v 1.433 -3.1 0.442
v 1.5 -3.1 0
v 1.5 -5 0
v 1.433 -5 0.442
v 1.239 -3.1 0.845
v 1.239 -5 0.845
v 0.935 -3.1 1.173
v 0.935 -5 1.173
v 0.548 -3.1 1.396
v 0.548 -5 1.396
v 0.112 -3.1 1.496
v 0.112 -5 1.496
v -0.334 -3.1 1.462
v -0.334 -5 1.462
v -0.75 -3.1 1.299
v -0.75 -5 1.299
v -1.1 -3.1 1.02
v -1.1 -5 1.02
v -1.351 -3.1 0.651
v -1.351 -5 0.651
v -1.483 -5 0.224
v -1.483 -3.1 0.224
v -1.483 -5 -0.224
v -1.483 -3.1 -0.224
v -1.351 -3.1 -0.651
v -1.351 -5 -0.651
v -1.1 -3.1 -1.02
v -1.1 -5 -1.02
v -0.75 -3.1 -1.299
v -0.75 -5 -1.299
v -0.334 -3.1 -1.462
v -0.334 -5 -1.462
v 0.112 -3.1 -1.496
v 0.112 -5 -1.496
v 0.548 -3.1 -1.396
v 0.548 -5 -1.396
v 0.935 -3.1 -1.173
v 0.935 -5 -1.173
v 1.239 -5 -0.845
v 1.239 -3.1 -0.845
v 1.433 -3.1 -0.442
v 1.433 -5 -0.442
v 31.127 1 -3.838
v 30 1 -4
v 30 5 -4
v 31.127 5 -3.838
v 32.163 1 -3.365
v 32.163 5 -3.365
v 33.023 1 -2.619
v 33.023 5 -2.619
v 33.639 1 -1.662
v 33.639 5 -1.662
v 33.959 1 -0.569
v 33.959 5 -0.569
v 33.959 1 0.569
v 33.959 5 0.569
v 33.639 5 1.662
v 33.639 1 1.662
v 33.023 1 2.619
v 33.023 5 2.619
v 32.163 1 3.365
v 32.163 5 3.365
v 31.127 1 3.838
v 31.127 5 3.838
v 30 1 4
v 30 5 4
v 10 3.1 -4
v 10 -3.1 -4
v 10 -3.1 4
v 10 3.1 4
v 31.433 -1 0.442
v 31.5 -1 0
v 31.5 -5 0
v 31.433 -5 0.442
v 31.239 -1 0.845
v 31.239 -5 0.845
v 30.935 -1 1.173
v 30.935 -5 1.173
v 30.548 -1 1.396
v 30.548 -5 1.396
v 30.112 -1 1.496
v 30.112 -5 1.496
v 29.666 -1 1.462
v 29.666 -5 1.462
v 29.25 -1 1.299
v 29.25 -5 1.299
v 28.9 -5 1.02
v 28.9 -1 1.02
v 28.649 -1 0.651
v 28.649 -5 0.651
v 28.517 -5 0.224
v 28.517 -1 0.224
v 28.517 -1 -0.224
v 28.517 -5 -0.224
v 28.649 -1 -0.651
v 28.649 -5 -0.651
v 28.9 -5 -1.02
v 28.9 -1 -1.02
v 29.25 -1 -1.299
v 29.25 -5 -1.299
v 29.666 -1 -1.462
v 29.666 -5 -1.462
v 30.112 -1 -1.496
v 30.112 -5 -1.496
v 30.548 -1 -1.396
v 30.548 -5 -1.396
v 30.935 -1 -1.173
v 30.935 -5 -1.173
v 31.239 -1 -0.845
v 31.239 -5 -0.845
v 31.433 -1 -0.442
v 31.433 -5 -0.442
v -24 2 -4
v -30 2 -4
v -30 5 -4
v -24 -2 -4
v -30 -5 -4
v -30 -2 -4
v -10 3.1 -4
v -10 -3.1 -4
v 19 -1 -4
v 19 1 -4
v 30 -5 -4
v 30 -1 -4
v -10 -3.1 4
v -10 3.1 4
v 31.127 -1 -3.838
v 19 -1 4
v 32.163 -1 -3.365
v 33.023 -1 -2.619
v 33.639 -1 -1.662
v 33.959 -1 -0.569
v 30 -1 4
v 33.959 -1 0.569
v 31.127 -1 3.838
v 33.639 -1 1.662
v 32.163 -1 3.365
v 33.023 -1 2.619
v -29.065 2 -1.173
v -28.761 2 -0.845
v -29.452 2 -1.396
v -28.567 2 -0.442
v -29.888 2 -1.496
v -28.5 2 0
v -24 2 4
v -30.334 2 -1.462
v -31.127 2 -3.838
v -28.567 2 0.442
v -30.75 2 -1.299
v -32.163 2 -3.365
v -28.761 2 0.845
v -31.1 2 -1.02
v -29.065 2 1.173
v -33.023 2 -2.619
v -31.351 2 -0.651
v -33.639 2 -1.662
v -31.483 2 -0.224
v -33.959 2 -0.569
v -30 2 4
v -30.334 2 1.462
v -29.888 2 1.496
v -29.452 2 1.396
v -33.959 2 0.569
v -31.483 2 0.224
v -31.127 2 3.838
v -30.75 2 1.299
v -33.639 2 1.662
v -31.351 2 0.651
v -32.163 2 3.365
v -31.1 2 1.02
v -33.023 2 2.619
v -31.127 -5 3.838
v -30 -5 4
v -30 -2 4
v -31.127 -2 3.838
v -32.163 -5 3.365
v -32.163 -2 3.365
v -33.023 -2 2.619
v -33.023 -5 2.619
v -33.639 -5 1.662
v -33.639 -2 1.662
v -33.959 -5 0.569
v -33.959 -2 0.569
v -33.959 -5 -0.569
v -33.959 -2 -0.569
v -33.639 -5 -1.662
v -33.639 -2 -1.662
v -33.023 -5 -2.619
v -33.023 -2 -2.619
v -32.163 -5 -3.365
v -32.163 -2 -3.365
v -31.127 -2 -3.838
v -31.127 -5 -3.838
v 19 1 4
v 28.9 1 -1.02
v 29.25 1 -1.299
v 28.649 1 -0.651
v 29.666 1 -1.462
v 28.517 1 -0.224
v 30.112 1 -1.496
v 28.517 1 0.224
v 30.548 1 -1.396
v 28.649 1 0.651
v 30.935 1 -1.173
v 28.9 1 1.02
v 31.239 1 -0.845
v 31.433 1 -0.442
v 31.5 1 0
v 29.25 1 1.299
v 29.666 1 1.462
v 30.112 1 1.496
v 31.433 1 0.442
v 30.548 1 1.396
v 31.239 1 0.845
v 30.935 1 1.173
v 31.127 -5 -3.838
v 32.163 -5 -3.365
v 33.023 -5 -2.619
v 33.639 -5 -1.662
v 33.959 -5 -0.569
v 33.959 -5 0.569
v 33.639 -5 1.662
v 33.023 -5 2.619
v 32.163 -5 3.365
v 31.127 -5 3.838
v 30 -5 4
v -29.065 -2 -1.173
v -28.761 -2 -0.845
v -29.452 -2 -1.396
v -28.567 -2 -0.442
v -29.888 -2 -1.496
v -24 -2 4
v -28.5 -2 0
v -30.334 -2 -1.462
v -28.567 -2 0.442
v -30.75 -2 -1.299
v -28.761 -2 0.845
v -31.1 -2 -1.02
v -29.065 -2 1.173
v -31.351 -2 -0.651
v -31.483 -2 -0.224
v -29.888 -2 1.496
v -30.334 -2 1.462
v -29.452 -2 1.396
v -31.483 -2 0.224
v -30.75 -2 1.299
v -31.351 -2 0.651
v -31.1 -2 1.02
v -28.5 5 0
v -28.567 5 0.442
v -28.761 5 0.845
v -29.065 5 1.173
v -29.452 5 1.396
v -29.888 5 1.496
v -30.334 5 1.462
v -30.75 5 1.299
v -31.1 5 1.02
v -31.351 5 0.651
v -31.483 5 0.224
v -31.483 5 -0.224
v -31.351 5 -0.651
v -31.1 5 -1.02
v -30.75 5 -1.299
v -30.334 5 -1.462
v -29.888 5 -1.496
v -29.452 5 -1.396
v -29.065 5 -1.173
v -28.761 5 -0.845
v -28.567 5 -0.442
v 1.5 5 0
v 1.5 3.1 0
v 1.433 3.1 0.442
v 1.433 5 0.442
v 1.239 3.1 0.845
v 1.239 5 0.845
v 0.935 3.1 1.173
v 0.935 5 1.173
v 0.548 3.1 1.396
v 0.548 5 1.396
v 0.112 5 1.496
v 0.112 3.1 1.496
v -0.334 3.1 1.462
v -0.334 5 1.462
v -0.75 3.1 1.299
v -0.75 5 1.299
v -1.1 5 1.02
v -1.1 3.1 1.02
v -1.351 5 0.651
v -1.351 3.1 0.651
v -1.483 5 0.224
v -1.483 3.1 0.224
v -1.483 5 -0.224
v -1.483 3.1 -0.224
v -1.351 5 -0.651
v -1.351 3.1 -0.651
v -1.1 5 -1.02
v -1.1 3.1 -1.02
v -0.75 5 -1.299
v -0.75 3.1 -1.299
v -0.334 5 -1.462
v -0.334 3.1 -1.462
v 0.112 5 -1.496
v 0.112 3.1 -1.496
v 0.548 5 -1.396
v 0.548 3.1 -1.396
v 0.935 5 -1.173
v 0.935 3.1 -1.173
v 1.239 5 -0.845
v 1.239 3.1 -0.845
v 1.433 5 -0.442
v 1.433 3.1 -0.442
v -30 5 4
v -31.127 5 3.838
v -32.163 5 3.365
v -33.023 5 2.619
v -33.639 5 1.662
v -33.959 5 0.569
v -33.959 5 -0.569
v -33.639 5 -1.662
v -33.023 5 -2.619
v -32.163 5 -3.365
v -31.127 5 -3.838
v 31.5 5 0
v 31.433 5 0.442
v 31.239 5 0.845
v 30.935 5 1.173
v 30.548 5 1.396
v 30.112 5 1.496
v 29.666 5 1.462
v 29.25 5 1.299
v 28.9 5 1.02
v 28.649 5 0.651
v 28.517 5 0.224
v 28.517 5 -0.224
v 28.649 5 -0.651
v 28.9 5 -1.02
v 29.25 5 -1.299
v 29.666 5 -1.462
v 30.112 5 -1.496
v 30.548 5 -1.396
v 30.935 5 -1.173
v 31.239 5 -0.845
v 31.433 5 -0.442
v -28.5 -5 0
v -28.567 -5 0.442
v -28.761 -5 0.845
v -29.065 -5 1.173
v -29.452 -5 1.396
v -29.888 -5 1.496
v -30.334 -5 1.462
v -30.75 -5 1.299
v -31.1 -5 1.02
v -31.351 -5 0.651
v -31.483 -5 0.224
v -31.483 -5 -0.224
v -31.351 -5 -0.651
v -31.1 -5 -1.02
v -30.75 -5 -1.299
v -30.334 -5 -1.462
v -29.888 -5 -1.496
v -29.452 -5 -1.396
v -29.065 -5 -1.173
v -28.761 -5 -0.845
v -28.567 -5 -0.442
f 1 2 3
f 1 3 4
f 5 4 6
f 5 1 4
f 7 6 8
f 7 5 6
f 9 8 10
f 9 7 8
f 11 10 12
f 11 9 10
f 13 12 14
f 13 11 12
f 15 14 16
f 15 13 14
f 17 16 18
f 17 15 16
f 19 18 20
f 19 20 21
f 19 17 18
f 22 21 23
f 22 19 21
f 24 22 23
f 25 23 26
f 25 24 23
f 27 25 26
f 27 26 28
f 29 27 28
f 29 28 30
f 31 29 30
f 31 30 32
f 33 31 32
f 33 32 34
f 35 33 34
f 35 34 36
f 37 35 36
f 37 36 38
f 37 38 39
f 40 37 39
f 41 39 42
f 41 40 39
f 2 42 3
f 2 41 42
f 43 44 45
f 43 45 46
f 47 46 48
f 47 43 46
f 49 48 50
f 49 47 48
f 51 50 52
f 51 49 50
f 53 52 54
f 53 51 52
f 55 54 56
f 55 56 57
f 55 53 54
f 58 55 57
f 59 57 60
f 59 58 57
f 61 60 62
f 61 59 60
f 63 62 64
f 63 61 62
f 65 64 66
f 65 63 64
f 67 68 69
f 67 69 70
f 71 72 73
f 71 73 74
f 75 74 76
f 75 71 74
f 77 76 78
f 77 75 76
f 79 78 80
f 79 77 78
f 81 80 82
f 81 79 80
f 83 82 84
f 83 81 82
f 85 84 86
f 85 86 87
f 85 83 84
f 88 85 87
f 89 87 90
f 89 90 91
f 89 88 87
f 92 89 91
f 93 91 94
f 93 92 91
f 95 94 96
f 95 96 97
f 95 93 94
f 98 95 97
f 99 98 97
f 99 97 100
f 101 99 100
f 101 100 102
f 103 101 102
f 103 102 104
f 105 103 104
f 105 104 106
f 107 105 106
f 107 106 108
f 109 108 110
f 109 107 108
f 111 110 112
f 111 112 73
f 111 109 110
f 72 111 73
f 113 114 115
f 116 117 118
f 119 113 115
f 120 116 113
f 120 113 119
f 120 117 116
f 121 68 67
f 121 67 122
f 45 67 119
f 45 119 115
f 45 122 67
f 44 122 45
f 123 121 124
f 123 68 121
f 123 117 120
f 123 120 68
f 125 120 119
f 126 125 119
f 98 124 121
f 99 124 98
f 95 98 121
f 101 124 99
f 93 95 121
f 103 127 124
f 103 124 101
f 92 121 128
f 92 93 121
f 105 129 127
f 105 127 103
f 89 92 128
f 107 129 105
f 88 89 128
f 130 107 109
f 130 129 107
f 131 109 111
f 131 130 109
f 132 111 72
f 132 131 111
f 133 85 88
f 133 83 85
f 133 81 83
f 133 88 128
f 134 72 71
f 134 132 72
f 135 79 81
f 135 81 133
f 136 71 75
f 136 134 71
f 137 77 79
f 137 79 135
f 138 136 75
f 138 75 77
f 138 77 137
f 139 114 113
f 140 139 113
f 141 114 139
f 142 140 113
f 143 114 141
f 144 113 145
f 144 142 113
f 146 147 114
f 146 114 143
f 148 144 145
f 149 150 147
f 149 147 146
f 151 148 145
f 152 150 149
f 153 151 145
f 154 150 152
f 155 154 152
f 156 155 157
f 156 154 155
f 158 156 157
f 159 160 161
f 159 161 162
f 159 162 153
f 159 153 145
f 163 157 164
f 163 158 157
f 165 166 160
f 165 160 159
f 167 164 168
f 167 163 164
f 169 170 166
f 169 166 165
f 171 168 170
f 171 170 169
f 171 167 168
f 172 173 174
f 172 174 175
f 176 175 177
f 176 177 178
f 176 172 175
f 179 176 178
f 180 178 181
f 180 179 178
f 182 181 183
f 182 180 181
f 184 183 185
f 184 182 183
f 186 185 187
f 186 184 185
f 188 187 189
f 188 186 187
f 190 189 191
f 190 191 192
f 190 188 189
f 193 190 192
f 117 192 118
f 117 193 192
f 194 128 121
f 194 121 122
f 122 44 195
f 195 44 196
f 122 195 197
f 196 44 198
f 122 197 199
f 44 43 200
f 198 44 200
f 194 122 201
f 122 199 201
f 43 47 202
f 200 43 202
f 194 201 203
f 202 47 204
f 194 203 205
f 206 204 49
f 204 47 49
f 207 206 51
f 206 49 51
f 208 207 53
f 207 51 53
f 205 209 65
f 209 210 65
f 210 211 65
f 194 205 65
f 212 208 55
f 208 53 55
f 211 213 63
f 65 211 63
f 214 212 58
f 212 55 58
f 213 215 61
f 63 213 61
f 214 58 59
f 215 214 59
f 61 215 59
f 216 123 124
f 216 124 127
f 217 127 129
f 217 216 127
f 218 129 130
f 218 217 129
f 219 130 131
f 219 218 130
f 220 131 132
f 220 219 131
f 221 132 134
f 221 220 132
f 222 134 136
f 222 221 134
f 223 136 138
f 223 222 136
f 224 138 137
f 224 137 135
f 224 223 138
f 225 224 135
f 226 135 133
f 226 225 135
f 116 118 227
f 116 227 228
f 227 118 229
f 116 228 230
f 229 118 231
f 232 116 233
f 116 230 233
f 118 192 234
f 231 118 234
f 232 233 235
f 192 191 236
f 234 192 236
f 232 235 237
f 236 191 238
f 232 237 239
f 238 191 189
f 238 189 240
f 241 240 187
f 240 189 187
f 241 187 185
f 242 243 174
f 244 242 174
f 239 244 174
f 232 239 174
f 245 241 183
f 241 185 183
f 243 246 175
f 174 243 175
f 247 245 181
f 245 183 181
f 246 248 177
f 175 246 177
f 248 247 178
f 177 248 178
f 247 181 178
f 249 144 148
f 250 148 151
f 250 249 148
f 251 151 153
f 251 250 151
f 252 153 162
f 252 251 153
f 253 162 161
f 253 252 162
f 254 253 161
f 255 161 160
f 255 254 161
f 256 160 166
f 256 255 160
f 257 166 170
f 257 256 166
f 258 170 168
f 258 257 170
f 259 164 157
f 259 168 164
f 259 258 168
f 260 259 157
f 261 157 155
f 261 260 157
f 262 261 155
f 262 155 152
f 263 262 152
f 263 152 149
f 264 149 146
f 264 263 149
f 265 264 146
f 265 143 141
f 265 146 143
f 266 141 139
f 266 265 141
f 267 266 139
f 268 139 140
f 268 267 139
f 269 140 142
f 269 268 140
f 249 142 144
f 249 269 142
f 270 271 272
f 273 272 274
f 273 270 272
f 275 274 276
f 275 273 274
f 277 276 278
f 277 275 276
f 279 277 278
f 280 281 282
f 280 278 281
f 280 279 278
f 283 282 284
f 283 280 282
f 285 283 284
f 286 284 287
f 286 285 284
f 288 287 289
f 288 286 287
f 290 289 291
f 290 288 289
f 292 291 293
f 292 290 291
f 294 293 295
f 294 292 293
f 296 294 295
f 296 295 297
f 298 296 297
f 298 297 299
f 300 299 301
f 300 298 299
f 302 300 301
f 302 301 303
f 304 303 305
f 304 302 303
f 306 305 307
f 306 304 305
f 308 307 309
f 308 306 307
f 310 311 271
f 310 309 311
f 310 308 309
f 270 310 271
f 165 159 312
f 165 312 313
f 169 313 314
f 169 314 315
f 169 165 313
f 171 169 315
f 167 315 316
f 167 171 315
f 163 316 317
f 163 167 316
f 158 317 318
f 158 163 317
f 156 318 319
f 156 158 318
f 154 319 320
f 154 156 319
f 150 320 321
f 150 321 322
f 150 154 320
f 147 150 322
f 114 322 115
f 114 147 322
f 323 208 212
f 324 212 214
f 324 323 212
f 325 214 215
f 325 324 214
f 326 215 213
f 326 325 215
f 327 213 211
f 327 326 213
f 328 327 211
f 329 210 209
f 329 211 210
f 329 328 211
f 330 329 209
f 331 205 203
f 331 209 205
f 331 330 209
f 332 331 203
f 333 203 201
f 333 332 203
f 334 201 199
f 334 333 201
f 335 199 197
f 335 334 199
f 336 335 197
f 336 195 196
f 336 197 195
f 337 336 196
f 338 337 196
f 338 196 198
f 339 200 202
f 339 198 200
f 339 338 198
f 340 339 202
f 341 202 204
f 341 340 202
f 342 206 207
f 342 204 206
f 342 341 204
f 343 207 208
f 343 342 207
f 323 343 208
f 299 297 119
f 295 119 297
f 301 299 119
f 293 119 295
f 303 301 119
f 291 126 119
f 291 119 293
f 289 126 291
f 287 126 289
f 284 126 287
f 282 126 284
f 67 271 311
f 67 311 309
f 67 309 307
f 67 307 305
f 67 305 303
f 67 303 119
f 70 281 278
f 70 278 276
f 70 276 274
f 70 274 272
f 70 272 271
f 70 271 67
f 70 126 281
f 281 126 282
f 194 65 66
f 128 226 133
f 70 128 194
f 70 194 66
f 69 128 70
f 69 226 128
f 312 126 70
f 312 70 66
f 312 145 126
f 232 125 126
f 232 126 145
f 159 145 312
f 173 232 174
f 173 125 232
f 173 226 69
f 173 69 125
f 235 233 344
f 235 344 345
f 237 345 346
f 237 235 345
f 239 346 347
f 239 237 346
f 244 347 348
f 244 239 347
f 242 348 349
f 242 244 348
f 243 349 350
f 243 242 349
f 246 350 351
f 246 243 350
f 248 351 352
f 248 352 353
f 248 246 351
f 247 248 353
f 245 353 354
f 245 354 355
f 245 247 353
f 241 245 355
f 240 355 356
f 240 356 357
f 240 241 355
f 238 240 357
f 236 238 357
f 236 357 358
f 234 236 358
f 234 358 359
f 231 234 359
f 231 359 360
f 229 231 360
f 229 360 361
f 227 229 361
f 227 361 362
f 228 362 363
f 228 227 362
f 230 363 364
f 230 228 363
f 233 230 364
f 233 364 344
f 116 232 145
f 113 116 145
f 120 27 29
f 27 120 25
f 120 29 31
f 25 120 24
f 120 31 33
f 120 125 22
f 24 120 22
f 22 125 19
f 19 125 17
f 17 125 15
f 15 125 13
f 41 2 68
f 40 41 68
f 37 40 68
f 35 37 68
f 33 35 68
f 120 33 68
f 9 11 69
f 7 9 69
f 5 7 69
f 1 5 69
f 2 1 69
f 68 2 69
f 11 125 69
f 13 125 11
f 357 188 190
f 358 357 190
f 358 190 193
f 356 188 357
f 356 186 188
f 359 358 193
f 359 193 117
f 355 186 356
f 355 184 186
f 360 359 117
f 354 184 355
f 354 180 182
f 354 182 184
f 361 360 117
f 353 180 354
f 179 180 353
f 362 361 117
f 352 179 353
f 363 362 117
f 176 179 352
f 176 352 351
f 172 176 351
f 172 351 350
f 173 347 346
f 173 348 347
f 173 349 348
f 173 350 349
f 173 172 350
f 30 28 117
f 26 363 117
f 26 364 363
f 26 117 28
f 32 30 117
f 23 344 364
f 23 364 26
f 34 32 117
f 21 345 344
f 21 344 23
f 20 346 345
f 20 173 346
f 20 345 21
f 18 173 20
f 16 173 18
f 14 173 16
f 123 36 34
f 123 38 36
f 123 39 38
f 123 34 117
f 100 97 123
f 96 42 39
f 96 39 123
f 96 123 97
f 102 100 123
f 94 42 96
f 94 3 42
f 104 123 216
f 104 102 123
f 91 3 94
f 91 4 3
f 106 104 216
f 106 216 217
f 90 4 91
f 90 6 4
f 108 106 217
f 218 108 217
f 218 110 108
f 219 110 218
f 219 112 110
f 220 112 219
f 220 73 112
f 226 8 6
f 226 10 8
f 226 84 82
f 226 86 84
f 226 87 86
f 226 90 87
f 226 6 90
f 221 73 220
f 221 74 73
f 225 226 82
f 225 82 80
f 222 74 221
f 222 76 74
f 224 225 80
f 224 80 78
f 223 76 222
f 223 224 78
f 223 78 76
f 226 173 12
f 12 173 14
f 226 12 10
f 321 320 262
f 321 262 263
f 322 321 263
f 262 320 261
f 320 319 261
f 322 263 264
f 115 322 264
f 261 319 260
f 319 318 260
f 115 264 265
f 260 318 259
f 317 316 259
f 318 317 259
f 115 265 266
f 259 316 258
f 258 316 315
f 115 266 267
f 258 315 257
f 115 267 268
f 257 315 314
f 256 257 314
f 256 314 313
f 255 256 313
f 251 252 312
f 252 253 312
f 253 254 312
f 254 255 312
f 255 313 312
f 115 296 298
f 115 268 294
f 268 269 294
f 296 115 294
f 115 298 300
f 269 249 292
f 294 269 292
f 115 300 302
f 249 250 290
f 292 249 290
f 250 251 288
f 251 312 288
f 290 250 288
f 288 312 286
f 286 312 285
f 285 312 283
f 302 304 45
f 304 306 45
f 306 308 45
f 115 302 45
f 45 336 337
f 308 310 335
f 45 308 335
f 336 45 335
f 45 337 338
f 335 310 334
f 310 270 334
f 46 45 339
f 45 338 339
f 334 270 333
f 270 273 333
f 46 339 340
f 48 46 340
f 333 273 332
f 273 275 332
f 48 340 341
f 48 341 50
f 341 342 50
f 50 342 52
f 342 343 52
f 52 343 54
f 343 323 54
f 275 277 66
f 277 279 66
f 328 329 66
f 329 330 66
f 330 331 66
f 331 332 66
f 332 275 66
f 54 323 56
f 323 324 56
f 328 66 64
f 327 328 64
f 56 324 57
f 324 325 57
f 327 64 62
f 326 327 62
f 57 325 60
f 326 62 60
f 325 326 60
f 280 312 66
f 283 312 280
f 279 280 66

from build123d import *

# Parameters (mm, degrees)
F0_R      = 1.5
F1_DEPTH  = 5
F3_W      = 2
F3_H      = 8
F4_DEPTH  = 45
F6_W      = 20
F6_H      = 6.2
F7_DEPTH  = 25
F9_W      = 4
F9_H      = 8
F10_DEPTH = 40


with BuildPart() as f1:
    # F0 (on Front) → F1 (new body, symmetric)
    with BuildSketch(Plane.XZ):
        with BuildLine():
            ThreePointArc((30, -4), (34, 0), (30, 4))
            Line((30, 4), (-30, 4))
            ThreePointArc((-30, 4), (-34, 0), (-30, -4))
            Line((-30, -4), (30, -4))
        make_face()
        with Locations((-30, 0)):
            Circle(F0_R, mode=Mode.SUBTRACT)
        Circle(F0_R, mode=Mode.SUBTRACT)
        with Locations((30, 0)):
            Circle(F0_R, mode=Mode.SUBTRACT)
    extrude(amount=F1_DEPTH, both=True)

    # F3 (on offset) → F4 (cut)
    with BuildSketch(Plane.YZ.offset(64)):
        Rectangle(F3_W, F3_H)
    extrude(amount=-F4_DEPTH, mode=Mode.SUBTRACT)

    # F6 (on face) → F7 (cut)
    with BuildSketch(Plane.XY.offset(4)):
        Rectangle(F6_W, F6_H)
    extrude(amount=-F7_DEPTH, mode=Mode.SUBTRACT)

    # F9 (on offset) → F10 (cut)
    with BuildSketch(Plane.YZ.offset(-64)):
        Rectangle(F9_W, F9_H)
    extrude(amount=F10_DEPTH, mode=Mode.SUBTRACT)


solid = f1.part
